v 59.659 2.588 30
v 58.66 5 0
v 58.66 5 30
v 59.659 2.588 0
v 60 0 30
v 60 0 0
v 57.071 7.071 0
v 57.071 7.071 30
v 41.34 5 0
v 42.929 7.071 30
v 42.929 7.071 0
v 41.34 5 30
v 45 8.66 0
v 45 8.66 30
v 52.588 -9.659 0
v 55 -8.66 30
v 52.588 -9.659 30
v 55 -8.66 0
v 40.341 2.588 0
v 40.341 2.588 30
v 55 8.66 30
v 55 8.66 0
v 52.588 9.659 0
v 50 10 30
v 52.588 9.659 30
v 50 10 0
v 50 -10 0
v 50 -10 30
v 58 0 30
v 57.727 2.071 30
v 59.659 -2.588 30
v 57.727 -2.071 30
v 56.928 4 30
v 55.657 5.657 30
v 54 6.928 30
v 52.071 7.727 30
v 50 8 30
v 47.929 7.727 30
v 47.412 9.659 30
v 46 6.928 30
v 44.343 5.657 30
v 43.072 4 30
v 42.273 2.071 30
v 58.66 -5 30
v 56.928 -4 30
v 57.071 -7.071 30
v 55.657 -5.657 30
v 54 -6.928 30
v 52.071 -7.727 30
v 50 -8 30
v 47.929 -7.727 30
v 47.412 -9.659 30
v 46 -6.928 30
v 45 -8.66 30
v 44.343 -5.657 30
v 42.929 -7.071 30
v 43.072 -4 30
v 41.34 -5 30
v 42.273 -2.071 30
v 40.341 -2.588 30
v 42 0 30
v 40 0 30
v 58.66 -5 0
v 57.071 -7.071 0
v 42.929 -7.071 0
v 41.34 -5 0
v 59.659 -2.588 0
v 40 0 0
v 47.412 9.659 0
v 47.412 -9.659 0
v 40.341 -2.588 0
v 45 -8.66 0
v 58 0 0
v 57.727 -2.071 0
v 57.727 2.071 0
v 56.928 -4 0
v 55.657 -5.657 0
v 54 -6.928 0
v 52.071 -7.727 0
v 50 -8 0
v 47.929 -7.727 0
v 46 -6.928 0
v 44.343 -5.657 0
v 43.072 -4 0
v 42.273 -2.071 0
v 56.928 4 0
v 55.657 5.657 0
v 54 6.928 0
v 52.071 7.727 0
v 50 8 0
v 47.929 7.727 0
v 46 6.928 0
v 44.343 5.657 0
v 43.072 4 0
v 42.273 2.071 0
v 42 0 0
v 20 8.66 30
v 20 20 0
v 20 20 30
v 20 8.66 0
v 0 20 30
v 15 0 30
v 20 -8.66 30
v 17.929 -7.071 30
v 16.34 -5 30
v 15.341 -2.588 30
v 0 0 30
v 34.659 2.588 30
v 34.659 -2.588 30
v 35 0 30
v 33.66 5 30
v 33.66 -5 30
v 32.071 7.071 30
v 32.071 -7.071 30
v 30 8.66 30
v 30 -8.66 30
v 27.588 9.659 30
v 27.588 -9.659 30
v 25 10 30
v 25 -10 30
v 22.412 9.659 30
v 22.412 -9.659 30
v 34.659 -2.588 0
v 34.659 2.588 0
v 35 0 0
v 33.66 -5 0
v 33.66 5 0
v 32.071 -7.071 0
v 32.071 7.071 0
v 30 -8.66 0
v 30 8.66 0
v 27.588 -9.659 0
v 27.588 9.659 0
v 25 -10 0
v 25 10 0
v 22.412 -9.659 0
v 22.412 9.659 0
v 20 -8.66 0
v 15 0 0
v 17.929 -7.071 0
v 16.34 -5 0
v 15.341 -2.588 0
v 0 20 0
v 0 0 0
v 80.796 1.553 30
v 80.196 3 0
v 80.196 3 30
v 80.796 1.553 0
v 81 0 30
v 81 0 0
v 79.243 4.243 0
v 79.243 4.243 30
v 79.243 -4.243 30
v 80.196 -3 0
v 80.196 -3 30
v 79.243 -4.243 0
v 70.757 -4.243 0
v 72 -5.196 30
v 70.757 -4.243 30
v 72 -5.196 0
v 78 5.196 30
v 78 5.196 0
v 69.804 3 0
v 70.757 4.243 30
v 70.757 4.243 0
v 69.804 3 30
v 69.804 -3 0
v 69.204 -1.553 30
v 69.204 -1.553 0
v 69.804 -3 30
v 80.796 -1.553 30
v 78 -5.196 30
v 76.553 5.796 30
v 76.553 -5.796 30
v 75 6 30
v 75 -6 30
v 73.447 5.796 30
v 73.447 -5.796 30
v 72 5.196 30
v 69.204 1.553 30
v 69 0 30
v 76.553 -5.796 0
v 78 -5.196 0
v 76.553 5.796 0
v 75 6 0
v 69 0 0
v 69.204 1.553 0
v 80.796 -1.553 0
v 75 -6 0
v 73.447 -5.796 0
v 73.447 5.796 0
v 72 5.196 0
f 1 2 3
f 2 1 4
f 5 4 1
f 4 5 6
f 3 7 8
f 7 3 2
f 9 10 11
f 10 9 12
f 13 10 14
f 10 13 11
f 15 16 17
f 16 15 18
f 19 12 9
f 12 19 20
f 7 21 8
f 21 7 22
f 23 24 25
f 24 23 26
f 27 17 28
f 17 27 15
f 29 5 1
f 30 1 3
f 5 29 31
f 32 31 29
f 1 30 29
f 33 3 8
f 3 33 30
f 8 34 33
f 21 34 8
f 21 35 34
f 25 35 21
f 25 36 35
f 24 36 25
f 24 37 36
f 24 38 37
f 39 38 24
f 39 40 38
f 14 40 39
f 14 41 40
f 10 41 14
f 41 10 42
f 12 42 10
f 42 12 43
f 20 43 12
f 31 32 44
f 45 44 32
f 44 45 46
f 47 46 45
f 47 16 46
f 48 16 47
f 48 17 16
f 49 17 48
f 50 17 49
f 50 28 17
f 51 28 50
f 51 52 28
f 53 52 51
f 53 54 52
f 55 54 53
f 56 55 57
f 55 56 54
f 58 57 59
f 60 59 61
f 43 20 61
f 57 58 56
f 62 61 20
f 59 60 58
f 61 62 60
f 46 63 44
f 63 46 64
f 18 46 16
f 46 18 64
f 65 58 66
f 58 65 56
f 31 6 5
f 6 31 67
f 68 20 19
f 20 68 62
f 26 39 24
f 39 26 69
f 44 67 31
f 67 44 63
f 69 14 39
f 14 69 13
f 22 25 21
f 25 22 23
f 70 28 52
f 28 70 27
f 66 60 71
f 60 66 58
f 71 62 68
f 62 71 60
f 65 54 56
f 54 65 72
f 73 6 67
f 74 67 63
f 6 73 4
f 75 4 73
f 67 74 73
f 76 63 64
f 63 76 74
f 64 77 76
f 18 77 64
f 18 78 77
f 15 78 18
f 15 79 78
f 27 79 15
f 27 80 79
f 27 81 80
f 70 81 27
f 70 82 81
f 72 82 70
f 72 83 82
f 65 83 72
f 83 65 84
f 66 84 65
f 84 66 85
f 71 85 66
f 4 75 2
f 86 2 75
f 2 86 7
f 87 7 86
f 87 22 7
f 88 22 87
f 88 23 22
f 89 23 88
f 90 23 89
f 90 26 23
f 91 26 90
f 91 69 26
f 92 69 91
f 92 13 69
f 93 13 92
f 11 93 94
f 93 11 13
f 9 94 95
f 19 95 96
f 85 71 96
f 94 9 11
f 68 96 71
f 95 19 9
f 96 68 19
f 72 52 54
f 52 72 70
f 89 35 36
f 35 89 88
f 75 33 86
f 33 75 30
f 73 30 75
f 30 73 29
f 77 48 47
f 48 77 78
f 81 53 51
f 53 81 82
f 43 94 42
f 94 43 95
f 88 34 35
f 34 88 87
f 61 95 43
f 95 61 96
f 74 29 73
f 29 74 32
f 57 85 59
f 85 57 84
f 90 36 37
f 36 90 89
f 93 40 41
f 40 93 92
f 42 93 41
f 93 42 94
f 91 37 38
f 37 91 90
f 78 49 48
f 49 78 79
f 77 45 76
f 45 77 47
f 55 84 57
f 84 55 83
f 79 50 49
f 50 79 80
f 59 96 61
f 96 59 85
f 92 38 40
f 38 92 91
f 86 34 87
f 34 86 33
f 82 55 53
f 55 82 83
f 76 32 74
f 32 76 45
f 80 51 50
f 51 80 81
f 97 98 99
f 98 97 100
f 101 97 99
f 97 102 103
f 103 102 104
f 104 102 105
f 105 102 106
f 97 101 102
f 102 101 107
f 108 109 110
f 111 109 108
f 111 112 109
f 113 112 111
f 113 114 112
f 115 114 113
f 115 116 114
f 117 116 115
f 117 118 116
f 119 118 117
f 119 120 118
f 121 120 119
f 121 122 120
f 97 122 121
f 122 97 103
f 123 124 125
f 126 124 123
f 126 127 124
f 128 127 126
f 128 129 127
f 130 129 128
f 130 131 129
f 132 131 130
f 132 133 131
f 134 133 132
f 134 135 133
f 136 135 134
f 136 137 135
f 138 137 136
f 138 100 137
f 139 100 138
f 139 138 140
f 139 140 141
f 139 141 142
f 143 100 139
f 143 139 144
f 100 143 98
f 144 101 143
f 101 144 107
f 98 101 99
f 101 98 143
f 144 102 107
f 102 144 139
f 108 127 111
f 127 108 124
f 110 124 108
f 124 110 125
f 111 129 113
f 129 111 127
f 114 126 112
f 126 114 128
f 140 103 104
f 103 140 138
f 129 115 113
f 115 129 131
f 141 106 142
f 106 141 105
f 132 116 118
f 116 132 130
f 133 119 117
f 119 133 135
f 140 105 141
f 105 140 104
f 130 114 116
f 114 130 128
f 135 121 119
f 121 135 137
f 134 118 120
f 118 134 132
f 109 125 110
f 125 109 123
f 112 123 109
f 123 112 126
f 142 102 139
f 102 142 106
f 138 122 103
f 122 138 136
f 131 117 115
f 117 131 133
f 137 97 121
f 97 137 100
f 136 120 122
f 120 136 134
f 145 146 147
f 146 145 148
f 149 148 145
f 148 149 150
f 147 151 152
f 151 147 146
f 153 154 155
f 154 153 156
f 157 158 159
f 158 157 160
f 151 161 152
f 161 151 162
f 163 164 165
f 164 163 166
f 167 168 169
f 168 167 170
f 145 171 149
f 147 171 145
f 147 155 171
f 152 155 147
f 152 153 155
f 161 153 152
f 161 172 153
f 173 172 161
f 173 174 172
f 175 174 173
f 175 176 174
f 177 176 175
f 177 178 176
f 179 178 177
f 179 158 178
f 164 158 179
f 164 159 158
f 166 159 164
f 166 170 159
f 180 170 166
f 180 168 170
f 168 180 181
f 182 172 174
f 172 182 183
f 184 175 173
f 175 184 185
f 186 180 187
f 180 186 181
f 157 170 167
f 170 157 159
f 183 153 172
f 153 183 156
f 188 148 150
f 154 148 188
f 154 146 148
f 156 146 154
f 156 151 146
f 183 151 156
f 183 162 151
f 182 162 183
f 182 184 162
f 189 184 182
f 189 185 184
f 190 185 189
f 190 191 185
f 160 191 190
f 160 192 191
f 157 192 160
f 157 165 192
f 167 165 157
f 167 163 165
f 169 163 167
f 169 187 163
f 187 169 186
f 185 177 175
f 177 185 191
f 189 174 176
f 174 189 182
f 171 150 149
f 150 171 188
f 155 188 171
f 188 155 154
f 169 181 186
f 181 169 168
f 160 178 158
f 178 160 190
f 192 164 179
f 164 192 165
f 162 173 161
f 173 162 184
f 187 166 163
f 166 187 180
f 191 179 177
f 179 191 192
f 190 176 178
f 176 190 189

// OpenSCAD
// TEST 11: Variables and expressions
// Expected: shapes whose sizes come from computed expressions.
// Check: changing a variable value in the tree updates all dependent shapes.
// Check: expressions like r*2, h+wall render correctly.

$fn = 24;

base   = 20;
height = 30;
wall   = 2;
ratio  = 0.6;

// cube sized by variables
translate([0, 0, 0]) {
    cube([base, base, height]);
}

// cylinder: radius derived from base, height from height
translate([base + 5, 0, 0]) {
    cylinder(h=height, r=base/2);
}

// nested expression: inner cylinder
translate([base*2 + 10, 0, 0]) {
    difference() {
        cylinder(h=height, r=base/2);
        cylinder(h=height + 2, r=base/2 - wall);
    }
}

// scaled by ratio
translate([base*3 + 15, 0, 0]) {
    scale([ratio, ratio, 1]) {
        cylinder(h=height, r=base/2);
    }
}
